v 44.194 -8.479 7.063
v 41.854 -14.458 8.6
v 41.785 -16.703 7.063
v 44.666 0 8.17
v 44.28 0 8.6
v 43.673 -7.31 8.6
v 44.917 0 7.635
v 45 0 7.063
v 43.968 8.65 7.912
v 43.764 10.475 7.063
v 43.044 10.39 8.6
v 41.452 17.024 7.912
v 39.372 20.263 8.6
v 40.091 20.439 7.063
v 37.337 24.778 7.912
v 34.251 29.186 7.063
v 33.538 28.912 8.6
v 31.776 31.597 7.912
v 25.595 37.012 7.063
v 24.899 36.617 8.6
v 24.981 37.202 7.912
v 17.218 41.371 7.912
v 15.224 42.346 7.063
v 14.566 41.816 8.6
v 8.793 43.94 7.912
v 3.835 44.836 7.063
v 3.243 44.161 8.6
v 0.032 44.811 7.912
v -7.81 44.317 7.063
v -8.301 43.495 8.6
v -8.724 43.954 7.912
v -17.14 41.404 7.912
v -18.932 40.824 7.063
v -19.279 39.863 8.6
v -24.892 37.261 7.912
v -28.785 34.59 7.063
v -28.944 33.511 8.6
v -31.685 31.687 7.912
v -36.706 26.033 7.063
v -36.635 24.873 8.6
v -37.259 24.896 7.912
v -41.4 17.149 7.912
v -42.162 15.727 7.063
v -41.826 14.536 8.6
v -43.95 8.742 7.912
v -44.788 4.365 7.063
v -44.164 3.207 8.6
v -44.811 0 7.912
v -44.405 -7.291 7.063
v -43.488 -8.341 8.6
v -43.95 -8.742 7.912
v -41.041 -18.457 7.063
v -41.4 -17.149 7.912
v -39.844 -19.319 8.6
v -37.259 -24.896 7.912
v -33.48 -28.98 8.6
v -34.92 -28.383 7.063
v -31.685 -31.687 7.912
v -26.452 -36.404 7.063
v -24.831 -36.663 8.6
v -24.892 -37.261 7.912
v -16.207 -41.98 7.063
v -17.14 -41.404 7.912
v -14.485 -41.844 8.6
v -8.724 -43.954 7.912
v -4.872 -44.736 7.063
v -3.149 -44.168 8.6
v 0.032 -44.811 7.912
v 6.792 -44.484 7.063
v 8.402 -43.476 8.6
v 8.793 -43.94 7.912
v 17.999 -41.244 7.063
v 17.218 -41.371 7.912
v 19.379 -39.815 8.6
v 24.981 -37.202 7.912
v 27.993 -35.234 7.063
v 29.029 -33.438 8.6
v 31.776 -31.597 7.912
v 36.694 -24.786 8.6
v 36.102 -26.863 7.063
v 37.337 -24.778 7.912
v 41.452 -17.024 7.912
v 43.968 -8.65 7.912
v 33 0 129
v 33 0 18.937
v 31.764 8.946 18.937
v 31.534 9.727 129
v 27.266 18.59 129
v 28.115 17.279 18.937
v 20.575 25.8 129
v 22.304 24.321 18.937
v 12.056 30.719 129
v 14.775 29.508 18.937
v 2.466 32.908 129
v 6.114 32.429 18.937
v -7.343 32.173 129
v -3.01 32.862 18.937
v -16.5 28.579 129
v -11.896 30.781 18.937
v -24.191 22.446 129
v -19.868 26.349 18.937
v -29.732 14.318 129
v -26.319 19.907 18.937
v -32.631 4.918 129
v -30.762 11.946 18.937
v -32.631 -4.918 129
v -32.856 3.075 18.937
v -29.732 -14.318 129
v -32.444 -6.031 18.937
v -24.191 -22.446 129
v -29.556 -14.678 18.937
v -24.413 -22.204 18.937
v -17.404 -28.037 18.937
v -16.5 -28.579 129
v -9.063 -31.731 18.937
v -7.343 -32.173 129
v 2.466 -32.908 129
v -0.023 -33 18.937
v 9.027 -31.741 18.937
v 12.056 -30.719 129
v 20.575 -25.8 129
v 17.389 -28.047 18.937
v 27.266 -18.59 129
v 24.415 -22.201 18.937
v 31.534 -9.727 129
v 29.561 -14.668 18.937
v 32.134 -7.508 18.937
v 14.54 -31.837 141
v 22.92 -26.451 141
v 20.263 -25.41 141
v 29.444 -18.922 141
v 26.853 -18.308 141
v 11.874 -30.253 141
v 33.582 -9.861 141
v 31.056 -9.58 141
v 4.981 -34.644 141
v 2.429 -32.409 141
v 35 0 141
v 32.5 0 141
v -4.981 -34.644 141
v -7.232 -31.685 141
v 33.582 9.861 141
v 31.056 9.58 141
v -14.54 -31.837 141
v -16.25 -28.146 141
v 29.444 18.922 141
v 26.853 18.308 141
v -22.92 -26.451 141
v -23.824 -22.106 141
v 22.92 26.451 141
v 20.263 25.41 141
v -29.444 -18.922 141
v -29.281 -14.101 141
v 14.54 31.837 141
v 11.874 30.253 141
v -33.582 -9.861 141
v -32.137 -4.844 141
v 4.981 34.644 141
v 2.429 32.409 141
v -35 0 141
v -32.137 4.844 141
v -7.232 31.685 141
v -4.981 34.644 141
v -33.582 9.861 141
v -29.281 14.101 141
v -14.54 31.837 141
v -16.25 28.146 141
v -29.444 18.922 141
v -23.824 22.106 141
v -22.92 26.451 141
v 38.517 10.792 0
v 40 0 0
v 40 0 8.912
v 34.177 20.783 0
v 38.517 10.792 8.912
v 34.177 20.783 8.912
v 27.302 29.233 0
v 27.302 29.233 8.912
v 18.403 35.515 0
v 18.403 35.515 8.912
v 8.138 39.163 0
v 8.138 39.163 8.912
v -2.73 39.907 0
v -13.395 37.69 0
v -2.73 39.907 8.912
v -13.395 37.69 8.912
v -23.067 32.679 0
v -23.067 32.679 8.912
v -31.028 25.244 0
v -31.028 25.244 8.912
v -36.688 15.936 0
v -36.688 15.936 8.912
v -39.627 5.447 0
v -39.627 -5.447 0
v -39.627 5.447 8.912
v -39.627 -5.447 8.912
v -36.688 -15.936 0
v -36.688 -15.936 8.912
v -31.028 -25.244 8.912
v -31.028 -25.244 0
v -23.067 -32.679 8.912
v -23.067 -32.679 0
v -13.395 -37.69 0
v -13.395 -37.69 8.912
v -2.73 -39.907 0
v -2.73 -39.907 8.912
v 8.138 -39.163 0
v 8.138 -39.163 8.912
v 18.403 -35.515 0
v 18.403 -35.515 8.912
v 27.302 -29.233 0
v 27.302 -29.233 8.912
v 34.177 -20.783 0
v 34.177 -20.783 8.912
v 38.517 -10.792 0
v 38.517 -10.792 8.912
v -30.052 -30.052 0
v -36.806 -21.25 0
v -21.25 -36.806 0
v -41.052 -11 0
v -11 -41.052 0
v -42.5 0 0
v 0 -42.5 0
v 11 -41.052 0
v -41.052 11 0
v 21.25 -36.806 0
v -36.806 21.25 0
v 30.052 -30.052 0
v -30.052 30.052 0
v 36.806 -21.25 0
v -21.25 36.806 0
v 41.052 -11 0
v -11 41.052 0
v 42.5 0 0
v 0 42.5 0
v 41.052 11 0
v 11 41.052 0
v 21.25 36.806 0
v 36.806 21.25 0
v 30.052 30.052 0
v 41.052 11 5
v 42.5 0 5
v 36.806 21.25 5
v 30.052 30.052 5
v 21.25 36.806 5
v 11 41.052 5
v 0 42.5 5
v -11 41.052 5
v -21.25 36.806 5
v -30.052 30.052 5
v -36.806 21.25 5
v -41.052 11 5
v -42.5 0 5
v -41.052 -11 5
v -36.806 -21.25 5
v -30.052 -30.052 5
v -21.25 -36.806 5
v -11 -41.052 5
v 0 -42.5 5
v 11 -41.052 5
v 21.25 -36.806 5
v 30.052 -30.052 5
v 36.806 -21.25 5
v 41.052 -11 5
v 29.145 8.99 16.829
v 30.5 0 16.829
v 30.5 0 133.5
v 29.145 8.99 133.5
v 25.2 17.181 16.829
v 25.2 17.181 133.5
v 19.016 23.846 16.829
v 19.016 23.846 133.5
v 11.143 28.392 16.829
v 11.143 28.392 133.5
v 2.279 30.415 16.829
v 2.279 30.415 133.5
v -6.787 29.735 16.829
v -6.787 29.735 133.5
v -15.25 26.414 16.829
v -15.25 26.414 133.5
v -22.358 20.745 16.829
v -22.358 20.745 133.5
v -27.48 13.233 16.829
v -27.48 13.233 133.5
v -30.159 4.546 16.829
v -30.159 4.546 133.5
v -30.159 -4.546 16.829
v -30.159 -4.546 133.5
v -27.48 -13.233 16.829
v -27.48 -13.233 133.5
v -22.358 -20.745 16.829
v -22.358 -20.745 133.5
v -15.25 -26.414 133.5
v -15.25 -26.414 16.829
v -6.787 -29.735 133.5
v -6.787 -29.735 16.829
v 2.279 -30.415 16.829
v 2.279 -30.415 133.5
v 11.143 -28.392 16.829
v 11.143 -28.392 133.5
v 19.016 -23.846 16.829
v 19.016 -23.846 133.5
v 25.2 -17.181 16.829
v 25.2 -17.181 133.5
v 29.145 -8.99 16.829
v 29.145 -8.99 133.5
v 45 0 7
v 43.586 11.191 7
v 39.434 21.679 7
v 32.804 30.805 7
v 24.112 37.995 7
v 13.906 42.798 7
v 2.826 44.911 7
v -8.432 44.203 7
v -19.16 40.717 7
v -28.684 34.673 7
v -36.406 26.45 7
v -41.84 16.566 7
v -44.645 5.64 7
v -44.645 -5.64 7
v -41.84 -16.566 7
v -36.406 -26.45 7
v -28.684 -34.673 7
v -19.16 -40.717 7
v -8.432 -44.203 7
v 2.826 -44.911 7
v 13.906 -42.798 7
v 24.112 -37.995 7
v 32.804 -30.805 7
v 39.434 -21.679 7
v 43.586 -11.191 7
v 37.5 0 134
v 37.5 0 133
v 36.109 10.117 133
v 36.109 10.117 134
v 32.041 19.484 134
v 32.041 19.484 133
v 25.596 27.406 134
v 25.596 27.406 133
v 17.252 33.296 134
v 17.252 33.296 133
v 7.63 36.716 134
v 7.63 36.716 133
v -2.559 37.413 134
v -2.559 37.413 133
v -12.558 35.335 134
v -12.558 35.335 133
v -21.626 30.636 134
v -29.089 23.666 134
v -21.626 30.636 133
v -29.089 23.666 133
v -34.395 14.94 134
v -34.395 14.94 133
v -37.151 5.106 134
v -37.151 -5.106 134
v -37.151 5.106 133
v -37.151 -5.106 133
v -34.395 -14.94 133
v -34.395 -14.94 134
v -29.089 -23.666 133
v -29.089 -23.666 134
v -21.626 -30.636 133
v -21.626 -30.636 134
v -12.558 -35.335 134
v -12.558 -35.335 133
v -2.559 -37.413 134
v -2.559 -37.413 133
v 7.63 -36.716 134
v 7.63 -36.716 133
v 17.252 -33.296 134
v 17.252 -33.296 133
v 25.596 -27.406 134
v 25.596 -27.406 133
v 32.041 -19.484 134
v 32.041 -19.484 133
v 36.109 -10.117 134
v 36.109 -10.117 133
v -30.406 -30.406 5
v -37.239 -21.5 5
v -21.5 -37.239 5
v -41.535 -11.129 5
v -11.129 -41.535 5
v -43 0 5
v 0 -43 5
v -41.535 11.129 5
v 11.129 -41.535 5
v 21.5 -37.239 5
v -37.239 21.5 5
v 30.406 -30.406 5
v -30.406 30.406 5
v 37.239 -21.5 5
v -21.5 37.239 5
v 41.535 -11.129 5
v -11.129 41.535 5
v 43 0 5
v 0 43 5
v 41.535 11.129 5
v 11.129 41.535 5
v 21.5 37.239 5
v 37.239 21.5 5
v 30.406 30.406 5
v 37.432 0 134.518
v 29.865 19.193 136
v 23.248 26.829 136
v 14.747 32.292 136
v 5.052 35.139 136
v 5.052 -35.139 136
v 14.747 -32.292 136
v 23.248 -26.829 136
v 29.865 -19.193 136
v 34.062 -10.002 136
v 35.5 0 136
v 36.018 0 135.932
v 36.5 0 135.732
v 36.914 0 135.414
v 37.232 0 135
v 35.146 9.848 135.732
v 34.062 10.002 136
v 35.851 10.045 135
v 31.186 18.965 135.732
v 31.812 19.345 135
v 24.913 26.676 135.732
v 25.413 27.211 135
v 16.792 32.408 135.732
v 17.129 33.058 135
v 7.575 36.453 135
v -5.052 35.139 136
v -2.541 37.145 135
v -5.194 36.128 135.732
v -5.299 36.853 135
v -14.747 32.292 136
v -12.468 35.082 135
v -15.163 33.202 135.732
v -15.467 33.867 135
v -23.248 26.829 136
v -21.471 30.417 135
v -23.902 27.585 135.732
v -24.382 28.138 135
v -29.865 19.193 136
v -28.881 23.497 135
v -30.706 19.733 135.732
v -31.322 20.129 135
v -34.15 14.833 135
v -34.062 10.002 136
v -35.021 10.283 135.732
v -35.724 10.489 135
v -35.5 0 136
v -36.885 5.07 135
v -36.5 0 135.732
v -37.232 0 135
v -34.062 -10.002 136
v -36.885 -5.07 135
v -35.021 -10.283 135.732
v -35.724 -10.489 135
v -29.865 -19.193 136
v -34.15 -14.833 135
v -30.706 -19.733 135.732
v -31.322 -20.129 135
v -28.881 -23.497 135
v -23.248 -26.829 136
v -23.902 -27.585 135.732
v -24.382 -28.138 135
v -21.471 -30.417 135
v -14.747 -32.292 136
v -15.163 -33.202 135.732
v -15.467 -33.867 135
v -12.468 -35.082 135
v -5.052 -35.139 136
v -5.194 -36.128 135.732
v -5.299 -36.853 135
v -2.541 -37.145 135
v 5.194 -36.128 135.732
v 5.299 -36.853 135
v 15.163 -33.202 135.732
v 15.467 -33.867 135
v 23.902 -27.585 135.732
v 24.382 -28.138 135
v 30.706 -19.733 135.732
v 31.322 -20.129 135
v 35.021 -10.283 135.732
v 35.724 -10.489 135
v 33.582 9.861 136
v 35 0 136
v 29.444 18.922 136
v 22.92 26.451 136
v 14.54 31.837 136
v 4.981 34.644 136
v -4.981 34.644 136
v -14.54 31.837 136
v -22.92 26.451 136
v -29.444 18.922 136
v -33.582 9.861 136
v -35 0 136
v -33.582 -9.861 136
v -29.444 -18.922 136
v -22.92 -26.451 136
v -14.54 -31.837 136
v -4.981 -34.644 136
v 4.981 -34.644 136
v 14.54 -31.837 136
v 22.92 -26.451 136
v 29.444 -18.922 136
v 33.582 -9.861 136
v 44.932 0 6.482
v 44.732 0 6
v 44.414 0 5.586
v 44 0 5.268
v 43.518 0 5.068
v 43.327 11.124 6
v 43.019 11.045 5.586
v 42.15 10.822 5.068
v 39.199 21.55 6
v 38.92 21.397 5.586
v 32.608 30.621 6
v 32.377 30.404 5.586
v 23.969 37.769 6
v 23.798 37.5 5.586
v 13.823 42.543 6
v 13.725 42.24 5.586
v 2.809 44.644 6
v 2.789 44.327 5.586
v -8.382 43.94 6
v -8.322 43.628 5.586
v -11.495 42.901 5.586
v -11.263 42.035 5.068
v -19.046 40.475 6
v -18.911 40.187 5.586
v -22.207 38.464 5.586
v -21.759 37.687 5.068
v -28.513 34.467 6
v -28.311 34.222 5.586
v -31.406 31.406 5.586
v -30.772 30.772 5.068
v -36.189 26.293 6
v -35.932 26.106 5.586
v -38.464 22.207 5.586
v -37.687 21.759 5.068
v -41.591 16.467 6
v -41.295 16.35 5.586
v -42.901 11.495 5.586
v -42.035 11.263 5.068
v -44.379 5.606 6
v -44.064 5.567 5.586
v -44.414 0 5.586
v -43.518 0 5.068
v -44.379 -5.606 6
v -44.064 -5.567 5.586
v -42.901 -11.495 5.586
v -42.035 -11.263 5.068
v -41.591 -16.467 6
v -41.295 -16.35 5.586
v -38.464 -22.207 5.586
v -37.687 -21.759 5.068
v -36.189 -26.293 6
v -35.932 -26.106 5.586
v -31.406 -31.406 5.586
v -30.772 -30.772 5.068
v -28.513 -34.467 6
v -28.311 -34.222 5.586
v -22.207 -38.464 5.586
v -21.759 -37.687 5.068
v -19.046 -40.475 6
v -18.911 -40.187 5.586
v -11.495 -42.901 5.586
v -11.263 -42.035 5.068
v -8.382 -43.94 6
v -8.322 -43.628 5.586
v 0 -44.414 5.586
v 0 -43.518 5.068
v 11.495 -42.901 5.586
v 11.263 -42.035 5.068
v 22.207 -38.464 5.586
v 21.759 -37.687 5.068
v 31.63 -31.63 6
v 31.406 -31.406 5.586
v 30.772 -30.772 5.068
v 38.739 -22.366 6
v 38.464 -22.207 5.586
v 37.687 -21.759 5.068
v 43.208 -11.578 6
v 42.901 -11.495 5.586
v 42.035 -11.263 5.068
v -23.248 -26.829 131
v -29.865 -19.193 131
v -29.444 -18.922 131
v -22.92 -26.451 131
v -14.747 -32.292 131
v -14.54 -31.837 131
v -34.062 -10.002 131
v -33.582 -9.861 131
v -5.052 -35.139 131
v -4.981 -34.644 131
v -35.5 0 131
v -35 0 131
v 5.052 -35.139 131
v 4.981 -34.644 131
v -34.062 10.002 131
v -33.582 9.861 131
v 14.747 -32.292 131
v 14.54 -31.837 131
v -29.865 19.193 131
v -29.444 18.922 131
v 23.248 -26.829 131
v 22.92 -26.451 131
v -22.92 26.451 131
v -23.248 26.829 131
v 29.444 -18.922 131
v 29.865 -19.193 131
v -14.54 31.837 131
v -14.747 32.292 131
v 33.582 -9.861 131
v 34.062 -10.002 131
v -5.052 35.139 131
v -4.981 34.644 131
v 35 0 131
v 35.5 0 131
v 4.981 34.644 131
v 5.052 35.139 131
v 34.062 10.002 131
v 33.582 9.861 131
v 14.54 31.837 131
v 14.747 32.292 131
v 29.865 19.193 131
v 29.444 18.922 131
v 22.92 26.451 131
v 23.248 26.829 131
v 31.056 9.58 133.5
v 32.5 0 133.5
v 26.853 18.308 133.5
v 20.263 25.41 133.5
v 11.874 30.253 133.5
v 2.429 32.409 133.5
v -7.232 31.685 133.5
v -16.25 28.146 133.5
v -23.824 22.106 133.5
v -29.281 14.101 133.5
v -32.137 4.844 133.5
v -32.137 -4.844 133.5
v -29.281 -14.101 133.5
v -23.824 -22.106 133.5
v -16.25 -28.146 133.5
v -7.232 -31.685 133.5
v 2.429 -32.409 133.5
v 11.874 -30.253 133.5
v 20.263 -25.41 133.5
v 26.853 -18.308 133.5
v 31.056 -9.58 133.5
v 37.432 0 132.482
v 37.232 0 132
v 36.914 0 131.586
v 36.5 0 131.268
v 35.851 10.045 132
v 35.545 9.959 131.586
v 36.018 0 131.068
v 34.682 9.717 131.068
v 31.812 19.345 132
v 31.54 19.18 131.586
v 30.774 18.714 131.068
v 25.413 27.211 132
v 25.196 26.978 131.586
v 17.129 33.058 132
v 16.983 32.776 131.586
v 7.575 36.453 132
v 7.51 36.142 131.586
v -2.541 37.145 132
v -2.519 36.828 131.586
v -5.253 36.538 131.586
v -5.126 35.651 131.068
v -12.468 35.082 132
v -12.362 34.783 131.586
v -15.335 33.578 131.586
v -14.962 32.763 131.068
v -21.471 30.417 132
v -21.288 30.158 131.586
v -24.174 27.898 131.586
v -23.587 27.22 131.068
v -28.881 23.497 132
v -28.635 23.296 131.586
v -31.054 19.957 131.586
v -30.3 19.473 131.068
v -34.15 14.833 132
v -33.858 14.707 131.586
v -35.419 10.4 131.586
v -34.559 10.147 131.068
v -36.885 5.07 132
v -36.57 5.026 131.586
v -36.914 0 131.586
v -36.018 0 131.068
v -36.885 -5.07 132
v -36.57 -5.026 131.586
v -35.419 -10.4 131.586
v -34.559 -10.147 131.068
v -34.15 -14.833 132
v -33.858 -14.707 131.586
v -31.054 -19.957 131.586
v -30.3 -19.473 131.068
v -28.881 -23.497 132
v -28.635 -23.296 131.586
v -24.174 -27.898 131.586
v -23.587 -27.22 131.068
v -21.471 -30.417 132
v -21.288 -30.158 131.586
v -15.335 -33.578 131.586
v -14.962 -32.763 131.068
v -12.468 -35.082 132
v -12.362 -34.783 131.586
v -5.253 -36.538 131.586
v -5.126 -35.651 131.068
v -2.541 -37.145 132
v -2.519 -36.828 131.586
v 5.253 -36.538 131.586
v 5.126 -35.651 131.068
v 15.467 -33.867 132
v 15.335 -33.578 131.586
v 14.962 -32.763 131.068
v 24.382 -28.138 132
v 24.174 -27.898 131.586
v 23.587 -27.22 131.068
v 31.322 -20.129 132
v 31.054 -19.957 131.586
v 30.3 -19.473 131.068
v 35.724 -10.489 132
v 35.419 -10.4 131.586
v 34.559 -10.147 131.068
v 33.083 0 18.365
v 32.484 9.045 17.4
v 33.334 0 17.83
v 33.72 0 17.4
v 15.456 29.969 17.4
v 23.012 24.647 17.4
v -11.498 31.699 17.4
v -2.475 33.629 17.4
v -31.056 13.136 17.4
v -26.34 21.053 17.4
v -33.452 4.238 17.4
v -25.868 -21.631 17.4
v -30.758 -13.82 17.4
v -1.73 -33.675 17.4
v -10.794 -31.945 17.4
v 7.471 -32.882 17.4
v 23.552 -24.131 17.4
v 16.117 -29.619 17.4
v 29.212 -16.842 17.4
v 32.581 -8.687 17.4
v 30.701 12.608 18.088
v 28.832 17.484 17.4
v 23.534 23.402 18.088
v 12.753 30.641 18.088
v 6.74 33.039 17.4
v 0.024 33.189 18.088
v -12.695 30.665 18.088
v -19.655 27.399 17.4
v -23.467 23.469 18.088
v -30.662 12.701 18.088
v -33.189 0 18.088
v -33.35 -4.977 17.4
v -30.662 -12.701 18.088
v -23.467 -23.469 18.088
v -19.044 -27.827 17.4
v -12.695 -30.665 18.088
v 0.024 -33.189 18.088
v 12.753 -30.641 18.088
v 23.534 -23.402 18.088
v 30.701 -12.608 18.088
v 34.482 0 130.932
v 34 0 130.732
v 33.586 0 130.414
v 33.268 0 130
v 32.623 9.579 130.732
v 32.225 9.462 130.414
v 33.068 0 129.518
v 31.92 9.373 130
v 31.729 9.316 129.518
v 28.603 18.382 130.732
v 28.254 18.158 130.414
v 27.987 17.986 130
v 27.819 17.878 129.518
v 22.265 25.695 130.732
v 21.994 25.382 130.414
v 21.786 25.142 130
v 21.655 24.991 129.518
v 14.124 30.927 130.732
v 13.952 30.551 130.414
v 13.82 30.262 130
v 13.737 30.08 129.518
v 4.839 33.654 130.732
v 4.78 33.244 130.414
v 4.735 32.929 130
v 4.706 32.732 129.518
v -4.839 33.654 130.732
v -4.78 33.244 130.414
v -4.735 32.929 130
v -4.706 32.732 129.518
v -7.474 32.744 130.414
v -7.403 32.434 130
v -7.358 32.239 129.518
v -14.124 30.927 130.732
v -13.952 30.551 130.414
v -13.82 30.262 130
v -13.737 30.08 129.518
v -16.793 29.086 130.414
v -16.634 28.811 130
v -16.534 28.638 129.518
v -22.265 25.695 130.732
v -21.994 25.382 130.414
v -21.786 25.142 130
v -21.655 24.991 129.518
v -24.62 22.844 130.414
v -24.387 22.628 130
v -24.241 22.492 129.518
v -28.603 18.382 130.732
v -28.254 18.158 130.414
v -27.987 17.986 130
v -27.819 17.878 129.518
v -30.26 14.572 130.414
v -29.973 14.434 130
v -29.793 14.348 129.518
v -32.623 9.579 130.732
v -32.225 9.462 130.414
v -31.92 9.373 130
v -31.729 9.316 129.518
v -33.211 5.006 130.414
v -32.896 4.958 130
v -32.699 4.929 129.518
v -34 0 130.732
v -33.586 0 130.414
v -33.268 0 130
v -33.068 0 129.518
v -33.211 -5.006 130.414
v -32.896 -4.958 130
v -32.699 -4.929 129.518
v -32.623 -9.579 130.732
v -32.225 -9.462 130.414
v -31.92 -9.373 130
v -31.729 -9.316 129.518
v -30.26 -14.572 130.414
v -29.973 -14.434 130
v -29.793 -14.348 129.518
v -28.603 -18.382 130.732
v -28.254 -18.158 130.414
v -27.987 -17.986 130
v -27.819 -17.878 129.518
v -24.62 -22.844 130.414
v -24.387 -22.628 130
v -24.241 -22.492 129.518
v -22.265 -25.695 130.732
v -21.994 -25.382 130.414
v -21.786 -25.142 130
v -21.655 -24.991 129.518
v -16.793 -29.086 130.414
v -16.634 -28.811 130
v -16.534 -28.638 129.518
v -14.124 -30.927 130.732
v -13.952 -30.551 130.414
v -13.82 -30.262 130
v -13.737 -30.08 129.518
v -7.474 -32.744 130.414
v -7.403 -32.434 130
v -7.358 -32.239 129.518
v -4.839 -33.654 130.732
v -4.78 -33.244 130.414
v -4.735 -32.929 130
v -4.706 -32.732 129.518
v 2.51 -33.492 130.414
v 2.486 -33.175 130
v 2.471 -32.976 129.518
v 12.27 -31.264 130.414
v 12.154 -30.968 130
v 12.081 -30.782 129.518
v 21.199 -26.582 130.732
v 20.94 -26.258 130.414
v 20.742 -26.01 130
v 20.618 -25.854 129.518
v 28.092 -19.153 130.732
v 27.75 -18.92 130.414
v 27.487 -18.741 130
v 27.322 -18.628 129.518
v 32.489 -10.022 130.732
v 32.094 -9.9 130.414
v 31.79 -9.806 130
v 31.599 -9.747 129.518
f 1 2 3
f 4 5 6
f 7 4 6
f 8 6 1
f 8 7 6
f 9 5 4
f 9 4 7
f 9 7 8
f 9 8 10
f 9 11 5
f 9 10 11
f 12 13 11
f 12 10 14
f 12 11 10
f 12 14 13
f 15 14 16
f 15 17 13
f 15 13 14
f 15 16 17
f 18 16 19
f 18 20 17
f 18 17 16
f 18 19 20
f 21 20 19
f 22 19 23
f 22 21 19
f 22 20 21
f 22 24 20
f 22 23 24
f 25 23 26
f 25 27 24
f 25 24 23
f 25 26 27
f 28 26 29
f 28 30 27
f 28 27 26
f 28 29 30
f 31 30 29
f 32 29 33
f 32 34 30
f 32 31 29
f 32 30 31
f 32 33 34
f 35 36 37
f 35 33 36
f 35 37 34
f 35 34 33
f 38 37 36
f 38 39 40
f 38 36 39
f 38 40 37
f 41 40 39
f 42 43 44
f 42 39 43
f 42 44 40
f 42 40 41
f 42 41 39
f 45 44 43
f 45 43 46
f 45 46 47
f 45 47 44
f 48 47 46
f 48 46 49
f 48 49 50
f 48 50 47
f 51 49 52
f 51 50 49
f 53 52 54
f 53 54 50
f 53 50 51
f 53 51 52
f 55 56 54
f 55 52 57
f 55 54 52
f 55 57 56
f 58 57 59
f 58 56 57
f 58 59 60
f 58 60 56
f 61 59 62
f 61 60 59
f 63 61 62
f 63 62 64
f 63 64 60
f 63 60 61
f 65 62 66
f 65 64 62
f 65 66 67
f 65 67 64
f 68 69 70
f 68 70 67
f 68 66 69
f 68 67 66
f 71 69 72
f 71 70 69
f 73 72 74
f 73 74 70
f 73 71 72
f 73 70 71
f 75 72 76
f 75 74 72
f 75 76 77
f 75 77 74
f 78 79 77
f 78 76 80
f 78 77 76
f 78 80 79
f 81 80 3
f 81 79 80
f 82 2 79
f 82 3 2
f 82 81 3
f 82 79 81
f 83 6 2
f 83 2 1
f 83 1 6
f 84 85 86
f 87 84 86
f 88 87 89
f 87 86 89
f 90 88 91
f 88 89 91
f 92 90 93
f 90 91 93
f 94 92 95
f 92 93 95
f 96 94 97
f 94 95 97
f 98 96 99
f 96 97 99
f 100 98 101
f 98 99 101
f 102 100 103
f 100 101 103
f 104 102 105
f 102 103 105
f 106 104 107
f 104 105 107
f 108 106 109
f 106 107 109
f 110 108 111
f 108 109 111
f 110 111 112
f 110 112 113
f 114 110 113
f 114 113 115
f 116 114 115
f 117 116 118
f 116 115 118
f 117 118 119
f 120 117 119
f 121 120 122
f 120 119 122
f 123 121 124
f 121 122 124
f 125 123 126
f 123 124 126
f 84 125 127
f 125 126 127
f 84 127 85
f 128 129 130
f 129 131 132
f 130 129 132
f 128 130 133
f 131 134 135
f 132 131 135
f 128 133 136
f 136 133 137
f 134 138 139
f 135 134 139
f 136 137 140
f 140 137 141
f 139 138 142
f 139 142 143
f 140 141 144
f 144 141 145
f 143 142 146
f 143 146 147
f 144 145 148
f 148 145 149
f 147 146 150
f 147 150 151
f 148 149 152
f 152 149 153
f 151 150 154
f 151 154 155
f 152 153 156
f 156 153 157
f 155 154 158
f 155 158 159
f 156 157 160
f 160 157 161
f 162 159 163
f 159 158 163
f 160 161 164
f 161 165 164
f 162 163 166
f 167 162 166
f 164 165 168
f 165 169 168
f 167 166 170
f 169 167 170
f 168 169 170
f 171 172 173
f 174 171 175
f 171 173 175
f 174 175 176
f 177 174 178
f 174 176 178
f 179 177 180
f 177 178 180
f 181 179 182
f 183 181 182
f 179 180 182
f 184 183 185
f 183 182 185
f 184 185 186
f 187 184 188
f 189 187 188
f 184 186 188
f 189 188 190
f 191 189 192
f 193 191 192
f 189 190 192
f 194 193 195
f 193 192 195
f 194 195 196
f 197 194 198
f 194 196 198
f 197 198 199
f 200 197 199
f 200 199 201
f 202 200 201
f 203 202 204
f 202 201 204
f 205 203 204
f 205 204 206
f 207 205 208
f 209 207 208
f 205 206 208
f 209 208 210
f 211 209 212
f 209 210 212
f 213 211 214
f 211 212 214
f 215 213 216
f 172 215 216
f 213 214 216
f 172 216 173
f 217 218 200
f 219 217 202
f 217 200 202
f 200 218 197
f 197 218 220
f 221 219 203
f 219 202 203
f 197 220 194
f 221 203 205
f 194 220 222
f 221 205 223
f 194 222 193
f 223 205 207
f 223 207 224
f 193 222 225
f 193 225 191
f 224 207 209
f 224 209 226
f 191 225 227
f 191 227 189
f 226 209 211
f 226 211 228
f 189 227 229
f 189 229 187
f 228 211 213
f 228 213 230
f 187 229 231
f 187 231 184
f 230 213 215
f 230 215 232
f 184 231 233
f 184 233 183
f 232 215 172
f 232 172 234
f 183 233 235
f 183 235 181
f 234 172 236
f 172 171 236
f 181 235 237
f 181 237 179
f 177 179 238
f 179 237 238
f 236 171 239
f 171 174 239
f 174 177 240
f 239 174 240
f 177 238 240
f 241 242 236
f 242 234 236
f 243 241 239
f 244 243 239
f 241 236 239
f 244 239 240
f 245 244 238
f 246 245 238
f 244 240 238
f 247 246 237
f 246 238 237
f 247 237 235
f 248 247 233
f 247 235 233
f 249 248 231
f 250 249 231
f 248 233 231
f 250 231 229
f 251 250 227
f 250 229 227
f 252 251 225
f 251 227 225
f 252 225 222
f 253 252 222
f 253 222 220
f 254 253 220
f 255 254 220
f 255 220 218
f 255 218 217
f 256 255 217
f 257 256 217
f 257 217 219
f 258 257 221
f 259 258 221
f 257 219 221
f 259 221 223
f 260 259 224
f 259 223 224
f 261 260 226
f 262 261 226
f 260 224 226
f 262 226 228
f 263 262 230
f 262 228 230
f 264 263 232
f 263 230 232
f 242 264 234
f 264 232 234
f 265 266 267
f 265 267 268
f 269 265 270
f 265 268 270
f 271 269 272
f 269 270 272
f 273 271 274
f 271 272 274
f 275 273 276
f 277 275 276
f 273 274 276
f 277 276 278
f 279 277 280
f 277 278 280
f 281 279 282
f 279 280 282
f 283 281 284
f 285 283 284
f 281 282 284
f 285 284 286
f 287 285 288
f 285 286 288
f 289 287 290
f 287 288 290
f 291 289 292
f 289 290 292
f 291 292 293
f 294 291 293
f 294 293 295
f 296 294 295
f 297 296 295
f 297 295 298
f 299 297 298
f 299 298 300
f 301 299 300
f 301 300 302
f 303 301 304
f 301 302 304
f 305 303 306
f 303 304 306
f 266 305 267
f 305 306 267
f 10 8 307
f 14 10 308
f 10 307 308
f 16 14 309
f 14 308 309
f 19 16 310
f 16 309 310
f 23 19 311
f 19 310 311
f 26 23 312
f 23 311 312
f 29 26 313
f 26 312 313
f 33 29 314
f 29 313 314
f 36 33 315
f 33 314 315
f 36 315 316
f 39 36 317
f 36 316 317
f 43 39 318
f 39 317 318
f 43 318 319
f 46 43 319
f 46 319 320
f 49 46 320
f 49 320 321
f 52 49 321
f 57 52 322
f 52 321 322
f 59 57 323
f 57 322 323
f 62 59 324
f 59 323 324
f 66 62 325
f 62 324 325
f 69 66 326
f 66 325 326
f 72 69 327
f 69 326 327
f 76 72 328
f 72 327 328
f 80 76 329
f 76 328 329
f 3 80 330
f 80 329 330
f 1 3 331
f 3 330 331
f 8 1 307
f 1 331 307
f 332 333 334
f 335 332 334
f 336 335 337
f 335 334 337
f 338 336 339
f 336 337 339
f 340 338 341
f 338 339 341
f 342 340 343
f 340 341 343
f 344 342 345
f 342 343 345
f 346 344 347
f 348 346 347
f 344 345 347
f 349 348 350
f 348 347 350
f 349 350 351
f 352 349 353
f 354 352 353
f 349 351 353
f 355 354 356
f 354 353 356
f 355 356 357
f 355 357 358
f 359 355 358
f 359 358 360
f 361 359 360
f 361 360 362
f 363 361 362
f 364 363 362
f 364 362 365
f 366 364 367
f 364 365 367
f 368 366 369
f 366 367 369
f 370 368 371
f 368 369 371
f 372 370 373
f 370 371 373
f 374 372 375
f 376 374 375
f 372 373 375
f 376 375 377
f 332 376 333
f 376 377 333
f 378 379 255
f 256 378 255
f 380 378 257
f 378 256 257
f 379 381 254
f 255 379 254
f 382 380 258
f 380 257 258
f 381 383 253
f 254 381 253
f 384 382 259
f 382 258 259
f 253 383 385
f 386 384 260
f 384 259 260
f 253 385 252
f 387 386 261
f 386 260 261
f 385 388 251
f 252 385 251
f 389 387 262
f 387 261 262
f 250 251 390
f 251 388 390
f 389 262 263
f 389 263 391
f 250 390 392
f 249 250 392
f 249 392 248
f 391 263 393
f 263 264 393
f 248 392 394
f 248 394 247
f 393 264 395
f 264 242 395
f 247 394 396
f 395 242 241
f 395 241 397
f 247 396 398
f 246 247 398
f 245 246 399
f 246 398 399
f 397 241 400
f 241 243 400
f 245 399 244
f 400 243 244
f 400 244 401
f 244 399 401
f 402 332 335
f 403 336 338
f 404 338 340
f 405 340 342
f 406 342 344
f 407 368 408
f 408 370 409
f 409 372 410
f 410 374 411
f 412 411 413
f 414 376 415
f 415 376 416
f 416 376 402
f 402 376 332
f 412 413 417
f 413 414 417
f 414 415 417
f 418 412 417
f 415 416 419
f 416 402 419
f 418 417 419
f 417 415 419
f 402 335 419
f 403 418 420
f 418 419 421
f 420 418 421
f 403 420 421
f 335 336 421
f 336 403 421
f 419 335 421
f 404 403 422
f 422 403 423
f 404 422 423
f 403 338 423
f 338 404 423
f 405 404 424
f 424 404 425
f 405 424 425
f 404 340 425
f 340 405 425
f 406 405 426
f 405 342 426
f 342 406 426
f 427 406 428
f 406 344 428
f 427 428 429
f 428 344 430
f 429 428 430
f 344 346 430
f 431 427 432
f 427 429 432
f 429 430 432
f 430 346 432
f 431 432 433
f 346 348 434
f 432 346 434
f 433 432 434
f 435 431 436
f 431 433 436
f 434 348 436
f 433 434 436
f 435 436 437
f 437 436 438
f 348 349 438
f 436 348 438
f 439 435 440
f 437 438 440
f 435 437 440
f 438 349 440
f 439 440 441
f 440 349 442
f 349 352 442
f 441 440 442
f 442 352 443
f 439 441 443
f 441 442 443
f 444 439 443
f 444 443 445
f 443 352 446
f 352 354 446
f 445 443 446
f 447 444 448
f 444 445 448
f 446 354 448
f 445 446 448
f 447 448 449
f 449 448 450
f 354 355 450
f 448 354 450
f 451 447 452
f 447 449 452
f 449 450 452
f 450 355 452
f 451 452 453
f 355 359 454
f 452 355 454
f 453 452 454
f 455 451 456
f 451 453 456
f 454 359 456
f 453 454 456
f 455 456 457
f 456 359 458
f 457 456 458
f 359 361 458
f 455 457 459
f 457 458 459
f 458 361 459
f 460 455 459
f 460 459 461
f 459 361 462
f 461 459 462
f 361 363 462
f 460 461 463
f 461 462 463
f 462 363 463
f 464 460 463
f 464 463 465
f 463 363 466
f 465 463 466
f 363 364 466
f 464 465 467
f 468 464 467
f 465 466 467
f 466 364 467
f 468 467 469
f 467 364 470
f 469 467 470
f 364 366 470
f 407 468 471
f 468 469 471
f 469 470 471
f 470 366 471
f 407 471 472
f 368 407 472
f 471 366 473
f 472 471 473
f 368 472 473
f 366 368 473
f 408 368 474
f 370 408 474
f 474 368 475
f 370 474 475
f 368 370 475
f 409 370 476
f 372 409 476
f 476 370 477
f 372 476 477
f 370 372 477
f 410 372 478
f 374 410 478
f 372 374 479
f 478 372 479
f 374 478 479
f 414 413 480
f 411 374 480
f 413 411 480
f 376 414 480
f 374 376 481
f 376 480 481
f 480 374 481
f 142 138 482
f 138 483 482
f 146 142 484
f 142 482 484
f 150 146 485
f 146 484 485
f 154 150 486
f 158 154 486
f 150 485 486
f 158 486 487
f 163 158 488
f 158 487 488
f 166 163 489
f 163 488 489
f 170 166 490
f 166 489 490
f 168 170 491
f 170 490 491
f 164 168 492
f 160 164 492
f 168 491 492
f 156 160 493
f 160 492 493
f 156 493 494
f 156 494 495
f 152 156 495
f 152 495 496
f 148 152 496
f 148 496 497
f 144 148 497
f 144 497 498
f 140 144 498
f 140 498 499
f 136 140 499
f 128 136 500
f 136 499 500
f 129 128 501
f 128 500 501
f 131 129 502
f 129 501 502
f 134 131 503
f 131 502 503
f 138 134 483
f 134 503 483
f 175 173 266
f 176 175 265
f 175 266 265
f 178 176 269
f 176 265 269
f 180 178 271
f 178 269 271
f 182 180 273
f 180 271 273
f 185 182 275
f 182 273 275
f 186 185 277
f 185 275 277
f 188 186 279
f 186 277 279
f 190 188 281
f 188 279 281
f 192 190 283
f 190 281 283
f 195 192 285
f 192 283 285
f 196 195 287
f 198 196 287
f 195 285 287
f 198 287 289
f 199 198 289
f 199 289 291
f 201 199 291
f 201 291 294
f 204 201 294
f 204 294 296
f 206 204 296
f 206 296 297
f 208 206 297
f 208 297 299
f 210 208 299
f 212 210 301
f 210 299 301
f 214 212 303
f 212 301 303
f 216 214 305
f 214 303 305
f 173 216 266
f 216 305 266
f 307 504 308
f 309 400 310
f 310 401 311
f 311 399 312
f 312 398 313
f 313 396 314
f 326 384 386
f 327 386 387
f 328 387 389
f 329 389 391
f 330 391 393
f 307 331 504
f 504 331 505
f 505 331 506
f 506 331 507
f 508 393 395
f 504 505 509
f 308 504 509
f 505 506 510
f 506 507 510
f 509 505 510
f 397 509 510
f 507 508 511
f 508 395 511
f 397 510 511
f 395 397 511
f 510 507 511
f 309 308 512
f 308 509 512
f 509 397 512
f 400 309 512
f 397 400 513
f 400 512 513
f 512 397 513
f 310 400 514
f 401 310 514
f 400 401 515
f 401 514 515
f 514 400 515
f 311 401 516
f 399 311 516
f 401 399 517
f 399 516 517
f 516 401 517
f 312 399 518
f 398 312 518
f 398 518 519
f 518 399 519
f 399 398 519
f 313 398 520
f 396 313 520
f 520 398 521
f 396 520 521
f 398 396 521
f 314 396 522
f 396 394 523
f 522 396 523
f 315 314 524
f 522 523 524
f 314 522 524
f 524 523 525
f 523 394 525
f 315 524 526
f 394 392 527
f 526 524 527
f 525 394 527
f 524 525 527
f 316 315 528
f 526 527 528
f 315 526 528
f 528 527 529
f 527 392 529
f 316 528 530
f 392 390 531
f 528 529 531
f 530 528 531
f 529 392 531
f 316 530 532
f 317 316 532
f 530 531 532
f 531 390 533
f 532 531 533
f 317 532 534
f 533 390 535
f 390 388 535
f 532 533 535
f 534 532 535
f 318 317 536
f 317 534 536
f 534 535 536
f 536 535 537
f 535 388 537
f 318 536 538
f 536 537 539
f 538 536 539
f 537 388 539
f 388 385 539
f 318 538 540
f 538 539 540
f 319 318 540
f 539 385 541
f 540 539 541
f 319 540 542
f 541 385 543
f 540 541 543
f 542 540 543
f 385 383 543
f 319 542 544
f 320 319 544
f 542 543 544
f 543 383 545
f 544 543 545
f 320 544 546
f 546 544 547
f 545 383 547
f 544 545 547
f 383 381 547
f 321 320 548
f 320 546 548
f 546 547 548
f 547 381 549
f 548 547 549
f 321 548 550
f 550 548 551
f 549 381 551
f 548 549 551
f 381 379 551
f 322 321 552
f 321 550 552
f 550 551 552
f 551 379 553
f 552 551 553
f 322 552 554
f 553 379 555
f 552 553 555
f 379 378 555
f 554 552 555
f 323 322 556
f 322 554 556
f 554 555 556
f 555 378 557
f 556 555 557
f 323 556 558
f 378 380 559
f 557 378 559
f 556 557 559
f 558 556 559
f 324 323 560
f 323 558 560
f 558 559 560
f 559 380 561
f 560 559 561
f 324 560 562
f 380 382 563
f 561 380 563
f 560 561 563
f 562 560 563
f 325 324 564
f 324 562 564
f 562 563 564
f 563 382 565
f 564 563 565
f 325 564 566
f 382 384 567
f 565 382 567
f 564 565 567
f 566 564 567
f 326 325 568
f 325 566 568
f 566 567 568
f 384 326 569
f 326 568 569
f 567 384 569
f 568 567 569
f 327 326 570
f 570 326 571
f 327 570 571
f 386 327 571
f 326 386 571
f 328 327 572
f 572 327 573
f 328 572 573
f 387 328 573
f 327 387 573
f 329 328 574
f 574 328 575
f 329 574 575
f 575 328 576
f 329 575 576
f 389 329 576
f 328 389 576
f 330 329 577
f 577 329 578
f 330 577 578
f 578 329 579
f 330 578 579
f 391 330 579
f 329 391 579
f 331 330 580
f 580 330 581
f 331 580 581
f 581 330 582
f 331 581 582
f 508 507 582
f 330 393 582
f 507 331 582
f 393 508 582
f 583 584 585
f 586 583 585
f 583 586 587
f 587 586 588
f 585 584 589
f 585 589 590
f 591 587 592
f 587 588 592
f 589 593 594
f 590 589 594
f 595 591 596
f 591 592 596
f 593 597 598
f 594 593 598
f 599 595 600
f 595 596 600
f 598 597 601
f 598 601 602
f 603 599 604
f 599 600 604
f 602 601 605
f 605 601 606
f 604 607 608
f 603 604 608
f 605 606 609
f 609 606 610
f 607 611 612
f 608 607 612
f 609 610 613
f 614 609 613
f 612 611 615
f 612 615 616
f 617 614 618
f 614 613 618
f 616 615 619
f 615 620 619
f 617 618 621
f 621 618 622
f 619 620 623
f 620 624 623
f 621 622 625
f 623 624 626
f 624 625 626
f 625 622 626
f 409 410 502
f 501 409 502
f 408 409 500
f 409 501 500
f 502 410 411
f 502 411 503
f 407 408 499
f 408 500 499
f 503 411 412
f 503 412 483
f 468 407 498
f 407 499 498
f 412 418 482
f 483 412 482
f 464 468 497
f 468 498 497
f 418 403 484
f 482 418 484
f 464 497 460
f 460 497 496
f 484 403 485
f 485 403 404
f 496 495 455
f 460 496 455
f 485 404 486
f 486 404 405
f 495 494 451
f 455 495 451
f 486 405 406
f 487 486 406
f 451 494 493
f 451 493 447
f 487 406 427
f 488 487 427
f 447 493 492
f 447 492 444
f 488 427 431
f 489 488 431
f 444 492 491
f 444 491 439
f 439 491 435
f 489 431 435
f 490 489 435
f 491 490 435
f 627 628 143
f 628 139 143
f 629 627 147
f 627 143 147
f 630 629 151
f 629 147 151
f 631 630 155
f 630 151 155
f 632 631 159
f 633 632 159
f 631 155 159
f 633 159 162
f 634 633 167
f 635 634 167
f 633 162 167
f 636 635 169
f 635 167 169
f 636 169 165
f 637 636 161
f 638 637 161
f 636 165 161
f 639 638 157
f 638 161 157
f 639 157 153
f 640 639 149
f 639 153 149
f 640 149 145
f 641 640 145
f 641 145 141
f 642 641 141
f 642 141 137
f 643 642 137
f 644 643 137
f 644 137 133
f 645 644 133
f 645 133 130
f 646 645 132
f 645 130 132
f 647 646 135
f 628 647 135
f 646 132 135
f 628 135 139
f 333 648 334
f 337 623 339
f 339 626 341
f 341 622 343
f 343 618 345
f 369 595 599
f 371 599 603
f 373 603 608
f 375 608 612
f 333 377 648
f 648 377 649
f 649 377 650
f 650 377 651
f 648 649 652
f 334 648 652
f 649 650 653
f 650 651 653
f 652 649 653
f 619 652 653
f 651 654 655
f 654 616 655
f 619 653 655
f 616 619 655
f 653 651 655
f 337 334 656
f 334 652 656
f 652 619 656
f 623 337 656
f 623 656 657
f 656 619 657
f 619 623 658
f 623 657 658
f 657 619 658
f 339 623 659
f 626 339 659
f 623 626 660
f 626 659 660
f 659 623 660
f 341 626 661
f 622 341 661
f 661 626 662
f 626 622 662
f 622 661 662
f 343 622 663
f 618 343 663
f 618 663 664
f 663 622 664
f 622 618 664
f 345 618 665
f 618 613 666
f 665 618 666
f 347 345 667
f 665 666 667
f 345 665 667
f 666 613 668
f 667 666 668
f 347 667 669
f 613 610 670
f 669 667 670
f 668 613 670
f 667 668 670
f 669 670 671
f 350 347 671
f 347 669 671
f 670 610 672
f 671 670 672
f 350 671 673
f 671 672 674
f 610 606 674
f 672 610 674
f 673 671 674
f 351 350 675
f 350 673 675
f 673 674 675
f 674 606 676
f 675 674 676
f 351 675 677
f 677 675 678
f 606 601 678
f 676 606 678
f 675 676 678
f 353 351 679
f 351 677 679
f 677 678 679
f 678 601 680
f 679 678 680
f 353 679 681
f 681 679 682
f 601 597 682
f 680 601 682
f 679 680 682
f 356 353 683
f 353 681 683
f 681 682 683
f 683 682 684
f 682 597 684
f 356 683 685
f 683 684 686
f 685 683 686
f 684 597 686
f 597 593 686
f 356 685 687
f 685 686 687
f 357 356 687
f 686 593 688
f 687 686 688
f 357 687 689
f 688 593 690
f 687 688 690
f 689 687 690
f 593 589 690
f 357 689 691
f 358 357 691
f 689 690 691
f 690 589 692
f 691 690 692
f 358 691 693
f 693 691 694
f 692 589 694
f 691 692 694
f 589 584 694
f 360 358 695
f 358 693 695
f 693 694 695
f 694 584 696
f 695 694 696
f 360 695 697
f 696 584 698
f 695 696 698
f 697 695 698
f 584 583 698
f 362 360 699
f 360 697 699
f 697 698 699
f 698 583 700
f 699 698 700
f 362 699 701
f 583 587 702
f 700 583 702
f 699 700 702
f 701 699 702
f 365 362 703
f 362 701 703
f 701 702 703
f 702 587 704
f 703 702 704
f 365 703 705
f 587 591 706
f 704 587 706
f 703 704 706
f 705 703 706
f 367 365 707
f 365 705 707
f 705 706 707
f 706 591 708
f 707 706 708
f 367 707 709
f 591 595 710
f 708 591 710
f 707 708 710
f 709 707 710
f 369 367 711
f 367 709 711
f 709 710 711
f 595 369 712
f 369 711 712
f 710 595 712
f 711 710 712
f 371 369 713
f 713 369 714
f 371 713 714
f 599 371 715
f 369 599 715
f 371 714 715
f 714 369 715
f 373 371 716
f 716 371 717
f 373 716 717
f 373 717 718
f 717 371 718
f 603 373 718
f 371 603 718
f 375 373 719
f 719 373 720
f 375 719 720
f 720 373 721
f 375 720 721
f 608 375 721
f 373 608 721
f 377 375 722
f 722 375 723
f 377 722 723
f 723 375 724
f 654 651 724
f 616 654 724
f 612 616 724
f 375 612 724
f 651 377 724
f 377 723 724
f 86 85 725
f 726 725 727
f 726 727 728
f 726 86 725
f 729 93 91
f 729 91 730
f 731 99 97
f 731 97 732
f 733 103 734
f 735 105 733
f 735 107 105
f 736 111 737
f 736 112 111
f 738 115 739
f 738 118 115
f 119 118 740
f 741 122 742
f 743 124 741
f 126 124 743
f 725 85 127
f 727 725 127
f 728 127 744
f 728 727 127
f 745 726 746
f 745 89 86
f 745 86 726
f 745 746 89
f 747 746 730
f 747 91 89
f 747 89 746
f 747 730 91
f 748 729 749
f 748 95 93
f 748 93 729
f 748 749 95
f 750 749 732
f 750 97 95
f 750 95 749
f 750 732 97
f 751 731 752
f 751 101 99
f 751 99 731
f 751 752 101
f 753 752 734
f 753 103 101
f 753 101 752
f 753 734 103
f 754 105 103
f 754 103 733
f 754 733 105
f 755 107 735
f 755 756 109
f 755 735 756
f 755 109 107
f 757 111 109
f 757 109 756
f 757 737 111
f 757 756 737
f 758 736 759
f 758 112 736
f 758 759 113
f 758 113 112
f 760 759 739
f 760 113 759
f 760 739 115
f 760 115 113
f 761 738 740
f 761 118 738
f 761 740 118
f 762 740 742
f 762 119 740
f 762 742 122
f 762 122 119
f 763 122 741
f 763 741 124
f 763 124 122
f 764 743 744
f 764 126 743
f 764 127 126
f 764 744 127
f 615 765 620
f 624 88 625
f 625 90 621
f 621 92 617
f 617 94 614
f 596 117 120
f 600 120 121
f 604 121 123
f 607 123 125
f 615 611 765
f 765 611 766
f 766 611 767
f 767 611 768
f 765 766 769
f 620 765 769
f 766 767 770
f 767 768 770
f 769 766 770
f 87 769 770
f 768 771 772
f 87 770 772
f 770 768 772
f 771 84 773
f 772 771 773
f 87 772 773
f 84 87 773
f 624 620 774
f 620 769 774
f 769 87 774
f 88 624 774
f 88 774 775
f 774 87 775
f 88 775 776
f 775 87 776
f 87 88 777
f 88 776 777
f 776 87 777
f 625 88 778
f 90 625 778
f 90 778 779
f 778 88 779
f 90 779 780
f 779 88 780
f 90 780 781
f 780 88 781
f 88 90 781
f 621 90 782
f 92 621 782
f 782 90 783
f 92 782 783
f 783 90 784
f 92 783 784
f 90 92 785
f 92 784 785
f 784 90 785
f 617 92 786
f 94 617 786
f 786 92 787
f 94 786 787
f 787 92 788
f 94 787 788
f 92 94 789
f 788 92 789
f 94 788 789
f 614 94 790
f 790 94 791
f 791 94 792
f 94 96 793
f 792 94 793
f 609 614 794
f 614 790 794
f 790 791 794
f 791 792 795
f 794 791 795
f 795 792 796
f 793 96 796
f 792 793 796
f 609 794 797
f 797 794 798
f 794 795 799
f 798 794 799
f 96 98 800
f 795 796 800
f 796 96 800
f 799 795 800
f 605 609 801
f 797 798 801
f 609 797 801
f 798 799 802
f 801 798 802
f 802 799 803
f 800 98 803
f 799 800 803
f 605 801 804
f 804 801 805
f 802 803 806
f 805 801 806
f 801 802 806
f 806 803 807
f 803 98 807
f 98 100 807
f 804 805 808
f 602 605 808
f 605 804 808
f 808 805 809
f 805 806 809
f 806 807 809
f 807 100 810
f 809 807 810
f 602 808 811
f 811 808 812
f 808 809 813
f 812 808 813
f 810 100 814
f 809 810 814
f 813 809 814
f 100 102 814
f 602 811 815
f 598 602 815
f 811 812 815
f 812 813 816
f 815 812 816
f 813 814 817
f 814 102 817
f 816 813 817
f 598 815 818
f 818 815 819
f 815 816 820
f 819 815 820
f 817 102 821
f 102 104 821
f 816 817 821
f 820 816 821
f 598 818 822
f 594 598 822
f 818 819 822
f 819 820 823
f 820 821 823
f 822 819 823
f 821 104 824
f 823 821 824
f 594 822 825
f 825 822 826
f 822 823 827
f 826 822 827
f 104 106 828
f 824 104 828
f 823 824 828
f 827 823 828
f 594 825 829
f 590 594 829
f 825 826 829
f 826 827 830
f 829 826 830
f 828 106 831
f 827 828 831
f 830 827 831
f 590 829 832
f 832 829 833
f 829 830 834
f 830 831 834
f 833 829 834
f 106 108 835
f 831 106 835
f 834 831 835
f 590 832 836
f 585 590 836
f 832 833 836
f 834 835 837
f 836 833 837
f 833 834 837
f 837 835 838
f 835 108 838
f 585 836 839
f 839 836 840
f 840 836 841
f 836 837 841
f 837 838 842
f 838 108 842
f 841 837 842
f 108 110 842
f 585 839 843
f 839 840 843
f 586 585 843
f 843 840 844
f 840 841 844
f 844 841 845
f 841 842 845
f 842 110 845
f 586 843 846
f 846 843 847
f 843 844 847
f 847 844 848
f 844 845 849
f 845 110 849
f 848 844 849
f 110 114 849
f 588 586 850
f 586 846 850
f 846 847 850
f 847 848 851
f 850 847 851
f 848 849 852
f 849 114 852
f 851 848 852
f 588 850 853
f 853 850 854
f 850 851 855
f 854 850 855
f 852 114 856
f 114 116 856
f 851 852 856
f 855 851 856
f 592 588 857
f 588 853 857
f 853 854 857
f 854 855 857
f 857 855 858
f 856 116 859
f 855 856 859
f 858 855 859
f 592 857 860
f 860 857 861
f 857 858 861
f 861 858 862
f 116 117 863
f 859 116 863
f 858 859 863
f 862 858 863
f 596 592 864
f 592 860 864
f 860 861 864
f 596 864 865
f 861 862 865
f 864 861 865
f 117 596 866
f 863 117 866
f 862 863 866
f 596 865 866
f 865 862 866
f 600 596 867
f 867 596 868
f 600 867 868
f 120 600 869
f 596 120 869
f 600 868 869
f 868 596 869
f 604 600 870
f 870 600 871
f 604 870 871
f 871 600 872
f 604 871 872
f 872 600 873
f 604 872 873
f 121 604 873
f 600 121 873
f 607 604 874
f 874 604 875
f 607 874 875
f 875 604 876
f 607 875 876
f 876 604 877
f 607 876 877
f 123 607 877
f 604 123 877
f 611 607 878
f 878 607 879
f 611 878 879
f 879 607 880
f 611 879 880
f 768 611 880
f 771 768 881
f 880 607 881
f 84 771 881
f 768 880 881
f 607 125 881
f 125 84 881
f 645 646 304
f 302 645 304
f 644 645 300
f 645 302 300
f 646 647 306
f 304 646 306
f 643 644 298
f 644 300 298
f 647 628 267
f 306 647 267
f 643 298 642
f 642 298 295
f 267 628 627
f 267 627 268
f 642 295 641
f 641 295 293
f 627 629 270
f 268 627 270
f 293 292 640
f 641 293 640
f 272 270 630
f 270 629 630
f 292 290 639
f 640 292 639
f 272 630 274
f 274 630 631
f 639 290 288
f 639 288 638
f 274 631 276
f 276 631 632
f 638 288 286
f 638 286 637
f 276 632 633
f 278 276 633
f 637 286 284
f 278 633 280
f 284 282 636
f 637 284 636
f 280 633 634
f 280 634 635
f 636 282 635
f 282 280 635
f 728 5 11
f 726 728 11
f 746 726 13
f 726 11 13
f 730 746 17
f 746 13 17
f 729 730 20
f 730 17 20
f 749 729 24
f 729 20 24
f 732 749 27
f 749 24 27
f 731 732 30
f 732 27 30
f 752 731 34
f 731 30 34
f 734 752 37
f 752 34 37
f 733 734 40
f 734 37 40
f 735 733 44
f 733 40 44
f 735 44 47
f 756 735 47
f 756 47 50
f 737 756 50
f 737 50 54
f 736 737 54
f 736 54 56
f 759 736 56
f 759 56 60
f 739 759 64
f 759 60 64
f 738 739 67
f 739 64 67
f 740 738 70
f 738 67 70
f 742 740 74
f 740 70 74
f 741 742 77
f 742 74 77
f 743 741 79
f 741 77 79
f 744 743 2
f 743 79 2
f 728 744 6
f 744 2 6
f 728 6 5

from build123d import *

# Parameters (mm, degrees)
FILLET1_R = 2


with BuildPart() as part:
    # Sketch1 → Revolve1 (revolve)
    with BuildSketch(Plane(origin=(0, 0, 0), x_dir=(1, 0, 0), z_dir=(0, 1, 0))):
        Polygon((0, 0), (0, -141), (35, -141), (35, -136), (37.5, -136), (37.5, -131), (33, -131), (33, -18), (45, -8), (45, -5), (42.5, -5), (42.5, 0), align=None)
    revolve(axis=Axis((0, 0, 0), (0, 0, 1)))

    # Fillet1
    fillet1_edges = [part.edges().sort_by_distance(p)[0] for p in [
        (-37.5, 0, 136),
        (-37.5, 0, 131),
        (-33, 0, 131),
        (-33, 0, 18),
        (-45, 0, 8),
        (-45, 0, 5),
    ]]
    fillet(fillet1_edges, radius=FILLET1_R)

    # Sketch2 → Cut-Revolve1 (revolve, cut)
    with BuildSketch(Plane(origin=(0, 0, 0), x_dir=(1, 0, 0), z_dir=(0, 1, 0))):
        Polygon((40, 0), (40, -8.912395968), (30.5, -16.829062635), (30.5, -133.5), (32.5, -133.5), (32.5, -141), (0, -141), (0, 0), align=None)
    revolve(axis=Axis((0, 0, 0), (0, 0, 1)), mode=Mode.SUBTRACT)


solid = part.part
